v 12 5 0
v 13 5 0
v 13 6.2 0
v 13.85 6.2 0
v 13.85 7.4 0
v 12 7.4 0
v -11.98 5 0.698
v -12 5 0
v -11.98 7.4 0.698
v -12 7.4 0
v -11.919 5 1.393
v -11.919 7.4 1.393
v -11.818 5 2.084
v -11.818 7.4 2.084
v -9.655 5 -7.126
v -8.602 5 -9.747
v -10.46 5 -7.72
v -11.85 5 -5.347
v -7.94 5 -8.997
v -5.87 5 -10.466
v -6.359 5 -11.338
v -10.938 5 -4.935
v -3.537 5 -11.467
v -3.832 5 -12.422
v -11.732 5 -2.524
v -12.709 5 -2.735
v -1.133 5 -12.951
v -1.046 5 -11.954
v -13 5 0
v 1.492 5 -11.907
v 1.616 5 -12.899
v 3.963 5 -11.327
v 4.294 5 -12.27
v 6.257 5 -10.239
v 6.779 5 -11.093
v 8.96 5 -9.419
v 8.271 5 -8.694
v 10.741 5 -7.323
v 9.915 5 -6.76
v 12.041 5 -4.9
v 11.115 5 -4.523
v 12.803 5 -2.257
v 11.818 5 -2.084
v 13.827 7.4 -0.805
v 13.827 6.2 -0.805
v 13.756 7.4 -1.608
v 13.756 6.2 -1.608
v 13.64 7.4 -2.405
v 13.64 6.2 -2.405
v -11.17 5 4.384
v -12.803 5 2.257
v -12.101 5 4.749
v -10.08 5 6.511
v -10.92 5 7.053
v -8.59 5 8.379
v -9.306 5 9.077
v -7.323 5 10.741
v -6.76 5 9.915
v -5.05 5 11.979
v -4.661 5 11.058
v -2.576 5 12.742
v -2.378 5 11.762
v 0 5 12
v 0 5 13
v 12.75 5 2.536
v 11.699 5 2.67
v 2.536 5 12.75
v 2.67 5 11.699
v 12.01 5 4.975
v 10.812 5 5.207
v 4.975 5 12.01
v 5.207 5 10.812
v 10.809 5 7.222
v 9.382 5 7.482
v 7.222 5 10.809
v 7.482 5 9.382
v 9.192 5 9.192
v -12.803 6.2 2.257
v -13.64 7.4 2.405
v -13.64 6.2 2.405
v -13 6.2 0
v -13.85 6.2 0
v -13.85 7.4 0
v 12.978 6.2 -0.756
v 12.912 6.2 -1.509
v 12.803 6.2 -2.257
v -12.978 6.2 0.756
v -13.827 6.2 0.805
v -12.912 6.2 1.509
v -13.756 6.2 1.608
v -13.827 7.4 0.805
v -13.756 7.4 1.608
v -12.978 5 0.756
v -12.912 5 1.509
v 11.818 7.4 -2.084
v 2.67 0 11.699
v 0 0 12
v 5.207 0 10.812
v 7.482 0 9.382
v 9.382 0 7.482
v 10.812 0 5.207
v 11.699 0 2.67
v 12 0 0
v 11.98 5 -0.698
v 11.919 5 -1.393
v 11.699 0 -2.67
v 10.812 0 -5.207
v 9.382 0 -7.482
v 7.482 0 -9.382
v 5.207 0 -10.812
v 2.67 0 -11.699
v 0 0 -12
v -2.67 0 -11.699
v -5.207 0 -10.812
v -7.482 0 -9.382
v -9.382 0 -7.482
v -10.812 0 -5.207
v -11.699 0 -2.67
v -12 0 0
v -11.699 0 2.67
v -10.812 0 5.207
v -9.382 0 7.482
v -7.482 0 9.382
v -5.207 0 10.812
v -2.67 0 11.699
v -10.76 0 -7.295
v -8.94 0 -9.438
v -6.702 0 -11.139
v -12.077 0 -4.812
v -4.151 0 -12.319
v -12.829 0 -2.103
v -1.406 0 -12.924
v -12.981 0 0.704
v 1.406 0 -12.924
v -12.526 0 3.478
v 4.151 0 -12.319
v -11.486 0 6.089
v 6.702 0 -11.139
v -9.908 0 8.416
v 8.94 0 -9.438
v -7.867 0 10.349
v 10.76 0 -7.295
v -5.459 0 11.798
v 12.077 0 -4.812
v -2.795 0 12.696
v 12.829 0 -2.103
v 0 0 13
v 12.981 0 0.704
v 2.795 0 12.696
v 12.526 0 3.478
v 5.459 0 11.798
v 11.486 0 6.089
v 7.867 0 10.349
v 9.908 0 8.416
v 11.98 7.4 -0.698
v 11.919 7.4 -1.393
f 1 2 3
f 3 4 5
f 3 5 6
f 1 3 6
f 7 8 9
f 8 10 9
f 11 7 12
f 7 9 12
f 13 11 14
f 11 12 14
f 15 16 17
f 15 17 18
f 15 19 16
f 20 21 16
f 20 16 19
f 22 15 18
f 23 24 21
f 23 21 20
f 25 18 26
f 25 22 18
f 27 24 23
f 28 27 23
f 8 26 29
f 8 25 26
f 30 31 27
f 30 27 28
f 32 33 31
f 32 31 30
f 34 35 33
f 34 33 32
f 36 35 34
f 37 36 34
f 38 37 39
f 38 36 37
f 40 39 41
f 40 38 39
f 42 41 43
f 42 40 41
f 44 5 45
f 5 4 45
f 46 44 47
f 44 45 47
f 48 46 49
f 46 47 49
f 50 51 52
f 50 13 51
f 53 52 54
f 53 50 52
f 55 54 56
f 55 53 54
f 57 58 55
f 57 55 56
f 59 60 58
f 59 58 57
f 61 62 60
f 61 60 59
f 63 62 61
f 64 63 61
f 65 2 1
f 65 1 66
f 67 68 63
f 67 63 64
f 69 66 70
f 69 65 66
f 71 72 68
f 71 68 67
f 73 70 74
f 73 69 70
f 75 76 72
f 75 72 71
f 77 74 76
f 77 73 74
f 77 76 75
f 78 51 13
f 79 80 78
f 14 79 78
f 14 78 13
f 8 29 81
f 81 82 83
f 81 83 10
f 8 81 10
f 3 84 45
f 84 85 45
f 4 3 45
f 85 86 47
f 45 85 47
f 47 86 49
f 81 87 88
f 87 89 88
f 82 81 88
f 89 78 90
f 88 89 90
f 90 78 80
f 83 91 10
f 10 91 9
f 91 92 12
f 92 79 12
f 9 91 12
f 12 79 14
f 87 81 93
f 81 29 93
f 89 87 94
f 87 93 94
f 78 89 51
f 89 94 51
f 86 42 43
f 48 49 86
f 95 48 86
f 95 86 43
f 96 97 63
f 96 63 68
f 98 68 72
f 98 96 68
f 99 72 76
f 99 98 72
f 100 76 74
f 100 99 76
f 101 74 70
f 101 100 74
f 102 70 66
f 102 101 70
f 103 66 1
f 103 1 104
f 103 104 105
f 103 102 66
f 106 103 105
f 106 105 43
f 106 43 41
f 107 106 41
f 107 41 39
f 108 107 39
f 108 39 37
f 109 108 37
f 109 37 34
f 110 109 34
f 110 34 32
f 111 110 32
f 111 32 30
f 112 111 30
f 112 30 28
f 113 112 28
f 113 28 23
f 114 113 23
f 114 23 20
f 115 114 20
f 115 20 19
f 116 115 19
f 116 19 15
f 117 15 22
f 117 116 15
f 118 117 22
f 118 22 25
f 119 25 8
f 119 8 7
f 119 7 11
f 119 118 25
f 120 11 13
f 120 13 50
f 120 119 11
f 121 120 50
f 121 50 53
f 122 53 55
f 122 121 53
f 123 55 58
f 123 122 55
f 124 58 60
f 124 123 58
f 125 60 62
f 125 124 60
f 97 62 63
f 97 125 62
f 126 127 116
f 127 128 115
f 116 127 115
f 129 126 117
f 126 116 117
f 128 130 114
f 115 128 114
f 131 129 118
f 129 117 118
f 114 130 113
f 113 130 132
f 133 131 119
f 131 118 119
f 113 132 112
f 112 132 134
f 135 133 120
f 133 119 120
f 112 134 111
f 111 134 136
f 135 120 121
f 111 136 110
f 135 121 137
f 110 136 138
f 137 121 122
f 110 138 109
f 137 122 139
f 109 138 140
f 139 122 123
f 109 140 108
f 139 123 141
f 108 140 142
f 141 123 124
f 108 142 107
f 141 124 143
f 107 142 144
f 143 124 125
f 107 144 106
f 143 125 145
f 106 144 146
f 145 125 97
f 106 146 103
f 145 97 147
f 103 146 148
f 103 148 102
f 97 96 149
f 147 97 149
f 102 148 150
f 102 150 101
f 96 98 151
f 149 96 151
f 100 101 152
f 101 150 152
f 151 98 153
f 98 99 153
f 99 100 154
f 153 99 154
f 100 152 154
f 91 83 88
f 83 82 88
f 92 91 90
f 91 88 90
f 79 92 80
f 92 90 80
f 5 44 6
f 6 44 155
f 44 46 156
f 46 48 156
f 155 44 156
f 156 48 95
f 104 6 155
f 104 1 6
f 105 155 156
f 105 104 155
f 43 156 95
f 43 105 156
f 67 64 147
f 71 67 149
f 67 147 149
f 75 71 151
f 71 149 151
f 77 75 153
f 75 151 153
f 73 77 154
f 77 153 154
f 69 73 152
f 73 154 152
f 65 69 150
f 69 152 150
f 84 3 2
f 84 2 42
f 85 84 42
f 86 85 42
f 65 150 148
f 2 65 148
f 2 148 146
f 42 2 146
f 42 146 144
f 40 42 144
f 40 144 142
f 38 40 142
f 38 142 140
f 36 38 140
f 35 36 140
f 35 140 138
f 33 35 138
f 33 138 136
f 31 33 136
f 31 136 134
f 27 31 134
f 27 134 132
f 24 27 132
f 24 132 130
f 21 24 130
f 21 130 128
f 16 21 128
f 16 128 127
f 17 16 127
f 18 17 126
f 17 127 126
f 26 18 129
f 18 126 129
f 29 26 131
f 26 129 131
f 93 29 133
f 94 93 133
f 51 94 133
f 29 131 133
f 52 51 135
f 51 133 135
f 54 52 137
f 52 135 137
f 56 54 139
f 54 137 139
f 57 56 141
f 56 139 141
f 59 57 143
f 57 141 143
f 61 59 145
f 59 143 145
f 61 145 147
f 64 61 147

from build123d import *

# Parameters (mm, degrees)
SKETCH1_R           = 13
SKETCH1_R_2         = 12
BOSS_EXTRUDE1_DEPTH = 5
REVOLVE1_ANGLE      = 10


with BuildPart() as part:
    # Sketch1 → Boss-Extrude1 (new body)
    with BuildSketch(Plane(origin=(0, 0, 0), x_dir=(1, 0, 0), z_dir=(0, 1, 0))):
        with Locations(Location((0, 0, 0), (0, 0, 270))):
            Circle(SKETCH1_R)
        with Locations(Location((0, 0, 0), (0, 0, 270))):
            Circle(SKETCH1_R_2, mode=Mode.SUBTRACT)
    extrude(amount=BOSS_EXTRUDE1_DEPTH)

    # Sketch2 → Revolve1 (revolve)
    with BuildSketch(Plane.XY):
        Polygon((-13, 5), (-12, 5), (-12, 6.2), (-12, 7.4), (-13.85, 7.4), (-13.85, 6.2), (-13, 6.2), align=None)
        Polygon((12, 6.2), (12, 7.4), (13.85, 7.4), (13.85, 6.2), (13, 6.2), (13, 5), (12, 5), align=None)
    revolve(axis=Axis((0, 0, 0), (0, 1, 0)), revolution_arc=REVOLVE1_ANGLE)


solid = part.part
